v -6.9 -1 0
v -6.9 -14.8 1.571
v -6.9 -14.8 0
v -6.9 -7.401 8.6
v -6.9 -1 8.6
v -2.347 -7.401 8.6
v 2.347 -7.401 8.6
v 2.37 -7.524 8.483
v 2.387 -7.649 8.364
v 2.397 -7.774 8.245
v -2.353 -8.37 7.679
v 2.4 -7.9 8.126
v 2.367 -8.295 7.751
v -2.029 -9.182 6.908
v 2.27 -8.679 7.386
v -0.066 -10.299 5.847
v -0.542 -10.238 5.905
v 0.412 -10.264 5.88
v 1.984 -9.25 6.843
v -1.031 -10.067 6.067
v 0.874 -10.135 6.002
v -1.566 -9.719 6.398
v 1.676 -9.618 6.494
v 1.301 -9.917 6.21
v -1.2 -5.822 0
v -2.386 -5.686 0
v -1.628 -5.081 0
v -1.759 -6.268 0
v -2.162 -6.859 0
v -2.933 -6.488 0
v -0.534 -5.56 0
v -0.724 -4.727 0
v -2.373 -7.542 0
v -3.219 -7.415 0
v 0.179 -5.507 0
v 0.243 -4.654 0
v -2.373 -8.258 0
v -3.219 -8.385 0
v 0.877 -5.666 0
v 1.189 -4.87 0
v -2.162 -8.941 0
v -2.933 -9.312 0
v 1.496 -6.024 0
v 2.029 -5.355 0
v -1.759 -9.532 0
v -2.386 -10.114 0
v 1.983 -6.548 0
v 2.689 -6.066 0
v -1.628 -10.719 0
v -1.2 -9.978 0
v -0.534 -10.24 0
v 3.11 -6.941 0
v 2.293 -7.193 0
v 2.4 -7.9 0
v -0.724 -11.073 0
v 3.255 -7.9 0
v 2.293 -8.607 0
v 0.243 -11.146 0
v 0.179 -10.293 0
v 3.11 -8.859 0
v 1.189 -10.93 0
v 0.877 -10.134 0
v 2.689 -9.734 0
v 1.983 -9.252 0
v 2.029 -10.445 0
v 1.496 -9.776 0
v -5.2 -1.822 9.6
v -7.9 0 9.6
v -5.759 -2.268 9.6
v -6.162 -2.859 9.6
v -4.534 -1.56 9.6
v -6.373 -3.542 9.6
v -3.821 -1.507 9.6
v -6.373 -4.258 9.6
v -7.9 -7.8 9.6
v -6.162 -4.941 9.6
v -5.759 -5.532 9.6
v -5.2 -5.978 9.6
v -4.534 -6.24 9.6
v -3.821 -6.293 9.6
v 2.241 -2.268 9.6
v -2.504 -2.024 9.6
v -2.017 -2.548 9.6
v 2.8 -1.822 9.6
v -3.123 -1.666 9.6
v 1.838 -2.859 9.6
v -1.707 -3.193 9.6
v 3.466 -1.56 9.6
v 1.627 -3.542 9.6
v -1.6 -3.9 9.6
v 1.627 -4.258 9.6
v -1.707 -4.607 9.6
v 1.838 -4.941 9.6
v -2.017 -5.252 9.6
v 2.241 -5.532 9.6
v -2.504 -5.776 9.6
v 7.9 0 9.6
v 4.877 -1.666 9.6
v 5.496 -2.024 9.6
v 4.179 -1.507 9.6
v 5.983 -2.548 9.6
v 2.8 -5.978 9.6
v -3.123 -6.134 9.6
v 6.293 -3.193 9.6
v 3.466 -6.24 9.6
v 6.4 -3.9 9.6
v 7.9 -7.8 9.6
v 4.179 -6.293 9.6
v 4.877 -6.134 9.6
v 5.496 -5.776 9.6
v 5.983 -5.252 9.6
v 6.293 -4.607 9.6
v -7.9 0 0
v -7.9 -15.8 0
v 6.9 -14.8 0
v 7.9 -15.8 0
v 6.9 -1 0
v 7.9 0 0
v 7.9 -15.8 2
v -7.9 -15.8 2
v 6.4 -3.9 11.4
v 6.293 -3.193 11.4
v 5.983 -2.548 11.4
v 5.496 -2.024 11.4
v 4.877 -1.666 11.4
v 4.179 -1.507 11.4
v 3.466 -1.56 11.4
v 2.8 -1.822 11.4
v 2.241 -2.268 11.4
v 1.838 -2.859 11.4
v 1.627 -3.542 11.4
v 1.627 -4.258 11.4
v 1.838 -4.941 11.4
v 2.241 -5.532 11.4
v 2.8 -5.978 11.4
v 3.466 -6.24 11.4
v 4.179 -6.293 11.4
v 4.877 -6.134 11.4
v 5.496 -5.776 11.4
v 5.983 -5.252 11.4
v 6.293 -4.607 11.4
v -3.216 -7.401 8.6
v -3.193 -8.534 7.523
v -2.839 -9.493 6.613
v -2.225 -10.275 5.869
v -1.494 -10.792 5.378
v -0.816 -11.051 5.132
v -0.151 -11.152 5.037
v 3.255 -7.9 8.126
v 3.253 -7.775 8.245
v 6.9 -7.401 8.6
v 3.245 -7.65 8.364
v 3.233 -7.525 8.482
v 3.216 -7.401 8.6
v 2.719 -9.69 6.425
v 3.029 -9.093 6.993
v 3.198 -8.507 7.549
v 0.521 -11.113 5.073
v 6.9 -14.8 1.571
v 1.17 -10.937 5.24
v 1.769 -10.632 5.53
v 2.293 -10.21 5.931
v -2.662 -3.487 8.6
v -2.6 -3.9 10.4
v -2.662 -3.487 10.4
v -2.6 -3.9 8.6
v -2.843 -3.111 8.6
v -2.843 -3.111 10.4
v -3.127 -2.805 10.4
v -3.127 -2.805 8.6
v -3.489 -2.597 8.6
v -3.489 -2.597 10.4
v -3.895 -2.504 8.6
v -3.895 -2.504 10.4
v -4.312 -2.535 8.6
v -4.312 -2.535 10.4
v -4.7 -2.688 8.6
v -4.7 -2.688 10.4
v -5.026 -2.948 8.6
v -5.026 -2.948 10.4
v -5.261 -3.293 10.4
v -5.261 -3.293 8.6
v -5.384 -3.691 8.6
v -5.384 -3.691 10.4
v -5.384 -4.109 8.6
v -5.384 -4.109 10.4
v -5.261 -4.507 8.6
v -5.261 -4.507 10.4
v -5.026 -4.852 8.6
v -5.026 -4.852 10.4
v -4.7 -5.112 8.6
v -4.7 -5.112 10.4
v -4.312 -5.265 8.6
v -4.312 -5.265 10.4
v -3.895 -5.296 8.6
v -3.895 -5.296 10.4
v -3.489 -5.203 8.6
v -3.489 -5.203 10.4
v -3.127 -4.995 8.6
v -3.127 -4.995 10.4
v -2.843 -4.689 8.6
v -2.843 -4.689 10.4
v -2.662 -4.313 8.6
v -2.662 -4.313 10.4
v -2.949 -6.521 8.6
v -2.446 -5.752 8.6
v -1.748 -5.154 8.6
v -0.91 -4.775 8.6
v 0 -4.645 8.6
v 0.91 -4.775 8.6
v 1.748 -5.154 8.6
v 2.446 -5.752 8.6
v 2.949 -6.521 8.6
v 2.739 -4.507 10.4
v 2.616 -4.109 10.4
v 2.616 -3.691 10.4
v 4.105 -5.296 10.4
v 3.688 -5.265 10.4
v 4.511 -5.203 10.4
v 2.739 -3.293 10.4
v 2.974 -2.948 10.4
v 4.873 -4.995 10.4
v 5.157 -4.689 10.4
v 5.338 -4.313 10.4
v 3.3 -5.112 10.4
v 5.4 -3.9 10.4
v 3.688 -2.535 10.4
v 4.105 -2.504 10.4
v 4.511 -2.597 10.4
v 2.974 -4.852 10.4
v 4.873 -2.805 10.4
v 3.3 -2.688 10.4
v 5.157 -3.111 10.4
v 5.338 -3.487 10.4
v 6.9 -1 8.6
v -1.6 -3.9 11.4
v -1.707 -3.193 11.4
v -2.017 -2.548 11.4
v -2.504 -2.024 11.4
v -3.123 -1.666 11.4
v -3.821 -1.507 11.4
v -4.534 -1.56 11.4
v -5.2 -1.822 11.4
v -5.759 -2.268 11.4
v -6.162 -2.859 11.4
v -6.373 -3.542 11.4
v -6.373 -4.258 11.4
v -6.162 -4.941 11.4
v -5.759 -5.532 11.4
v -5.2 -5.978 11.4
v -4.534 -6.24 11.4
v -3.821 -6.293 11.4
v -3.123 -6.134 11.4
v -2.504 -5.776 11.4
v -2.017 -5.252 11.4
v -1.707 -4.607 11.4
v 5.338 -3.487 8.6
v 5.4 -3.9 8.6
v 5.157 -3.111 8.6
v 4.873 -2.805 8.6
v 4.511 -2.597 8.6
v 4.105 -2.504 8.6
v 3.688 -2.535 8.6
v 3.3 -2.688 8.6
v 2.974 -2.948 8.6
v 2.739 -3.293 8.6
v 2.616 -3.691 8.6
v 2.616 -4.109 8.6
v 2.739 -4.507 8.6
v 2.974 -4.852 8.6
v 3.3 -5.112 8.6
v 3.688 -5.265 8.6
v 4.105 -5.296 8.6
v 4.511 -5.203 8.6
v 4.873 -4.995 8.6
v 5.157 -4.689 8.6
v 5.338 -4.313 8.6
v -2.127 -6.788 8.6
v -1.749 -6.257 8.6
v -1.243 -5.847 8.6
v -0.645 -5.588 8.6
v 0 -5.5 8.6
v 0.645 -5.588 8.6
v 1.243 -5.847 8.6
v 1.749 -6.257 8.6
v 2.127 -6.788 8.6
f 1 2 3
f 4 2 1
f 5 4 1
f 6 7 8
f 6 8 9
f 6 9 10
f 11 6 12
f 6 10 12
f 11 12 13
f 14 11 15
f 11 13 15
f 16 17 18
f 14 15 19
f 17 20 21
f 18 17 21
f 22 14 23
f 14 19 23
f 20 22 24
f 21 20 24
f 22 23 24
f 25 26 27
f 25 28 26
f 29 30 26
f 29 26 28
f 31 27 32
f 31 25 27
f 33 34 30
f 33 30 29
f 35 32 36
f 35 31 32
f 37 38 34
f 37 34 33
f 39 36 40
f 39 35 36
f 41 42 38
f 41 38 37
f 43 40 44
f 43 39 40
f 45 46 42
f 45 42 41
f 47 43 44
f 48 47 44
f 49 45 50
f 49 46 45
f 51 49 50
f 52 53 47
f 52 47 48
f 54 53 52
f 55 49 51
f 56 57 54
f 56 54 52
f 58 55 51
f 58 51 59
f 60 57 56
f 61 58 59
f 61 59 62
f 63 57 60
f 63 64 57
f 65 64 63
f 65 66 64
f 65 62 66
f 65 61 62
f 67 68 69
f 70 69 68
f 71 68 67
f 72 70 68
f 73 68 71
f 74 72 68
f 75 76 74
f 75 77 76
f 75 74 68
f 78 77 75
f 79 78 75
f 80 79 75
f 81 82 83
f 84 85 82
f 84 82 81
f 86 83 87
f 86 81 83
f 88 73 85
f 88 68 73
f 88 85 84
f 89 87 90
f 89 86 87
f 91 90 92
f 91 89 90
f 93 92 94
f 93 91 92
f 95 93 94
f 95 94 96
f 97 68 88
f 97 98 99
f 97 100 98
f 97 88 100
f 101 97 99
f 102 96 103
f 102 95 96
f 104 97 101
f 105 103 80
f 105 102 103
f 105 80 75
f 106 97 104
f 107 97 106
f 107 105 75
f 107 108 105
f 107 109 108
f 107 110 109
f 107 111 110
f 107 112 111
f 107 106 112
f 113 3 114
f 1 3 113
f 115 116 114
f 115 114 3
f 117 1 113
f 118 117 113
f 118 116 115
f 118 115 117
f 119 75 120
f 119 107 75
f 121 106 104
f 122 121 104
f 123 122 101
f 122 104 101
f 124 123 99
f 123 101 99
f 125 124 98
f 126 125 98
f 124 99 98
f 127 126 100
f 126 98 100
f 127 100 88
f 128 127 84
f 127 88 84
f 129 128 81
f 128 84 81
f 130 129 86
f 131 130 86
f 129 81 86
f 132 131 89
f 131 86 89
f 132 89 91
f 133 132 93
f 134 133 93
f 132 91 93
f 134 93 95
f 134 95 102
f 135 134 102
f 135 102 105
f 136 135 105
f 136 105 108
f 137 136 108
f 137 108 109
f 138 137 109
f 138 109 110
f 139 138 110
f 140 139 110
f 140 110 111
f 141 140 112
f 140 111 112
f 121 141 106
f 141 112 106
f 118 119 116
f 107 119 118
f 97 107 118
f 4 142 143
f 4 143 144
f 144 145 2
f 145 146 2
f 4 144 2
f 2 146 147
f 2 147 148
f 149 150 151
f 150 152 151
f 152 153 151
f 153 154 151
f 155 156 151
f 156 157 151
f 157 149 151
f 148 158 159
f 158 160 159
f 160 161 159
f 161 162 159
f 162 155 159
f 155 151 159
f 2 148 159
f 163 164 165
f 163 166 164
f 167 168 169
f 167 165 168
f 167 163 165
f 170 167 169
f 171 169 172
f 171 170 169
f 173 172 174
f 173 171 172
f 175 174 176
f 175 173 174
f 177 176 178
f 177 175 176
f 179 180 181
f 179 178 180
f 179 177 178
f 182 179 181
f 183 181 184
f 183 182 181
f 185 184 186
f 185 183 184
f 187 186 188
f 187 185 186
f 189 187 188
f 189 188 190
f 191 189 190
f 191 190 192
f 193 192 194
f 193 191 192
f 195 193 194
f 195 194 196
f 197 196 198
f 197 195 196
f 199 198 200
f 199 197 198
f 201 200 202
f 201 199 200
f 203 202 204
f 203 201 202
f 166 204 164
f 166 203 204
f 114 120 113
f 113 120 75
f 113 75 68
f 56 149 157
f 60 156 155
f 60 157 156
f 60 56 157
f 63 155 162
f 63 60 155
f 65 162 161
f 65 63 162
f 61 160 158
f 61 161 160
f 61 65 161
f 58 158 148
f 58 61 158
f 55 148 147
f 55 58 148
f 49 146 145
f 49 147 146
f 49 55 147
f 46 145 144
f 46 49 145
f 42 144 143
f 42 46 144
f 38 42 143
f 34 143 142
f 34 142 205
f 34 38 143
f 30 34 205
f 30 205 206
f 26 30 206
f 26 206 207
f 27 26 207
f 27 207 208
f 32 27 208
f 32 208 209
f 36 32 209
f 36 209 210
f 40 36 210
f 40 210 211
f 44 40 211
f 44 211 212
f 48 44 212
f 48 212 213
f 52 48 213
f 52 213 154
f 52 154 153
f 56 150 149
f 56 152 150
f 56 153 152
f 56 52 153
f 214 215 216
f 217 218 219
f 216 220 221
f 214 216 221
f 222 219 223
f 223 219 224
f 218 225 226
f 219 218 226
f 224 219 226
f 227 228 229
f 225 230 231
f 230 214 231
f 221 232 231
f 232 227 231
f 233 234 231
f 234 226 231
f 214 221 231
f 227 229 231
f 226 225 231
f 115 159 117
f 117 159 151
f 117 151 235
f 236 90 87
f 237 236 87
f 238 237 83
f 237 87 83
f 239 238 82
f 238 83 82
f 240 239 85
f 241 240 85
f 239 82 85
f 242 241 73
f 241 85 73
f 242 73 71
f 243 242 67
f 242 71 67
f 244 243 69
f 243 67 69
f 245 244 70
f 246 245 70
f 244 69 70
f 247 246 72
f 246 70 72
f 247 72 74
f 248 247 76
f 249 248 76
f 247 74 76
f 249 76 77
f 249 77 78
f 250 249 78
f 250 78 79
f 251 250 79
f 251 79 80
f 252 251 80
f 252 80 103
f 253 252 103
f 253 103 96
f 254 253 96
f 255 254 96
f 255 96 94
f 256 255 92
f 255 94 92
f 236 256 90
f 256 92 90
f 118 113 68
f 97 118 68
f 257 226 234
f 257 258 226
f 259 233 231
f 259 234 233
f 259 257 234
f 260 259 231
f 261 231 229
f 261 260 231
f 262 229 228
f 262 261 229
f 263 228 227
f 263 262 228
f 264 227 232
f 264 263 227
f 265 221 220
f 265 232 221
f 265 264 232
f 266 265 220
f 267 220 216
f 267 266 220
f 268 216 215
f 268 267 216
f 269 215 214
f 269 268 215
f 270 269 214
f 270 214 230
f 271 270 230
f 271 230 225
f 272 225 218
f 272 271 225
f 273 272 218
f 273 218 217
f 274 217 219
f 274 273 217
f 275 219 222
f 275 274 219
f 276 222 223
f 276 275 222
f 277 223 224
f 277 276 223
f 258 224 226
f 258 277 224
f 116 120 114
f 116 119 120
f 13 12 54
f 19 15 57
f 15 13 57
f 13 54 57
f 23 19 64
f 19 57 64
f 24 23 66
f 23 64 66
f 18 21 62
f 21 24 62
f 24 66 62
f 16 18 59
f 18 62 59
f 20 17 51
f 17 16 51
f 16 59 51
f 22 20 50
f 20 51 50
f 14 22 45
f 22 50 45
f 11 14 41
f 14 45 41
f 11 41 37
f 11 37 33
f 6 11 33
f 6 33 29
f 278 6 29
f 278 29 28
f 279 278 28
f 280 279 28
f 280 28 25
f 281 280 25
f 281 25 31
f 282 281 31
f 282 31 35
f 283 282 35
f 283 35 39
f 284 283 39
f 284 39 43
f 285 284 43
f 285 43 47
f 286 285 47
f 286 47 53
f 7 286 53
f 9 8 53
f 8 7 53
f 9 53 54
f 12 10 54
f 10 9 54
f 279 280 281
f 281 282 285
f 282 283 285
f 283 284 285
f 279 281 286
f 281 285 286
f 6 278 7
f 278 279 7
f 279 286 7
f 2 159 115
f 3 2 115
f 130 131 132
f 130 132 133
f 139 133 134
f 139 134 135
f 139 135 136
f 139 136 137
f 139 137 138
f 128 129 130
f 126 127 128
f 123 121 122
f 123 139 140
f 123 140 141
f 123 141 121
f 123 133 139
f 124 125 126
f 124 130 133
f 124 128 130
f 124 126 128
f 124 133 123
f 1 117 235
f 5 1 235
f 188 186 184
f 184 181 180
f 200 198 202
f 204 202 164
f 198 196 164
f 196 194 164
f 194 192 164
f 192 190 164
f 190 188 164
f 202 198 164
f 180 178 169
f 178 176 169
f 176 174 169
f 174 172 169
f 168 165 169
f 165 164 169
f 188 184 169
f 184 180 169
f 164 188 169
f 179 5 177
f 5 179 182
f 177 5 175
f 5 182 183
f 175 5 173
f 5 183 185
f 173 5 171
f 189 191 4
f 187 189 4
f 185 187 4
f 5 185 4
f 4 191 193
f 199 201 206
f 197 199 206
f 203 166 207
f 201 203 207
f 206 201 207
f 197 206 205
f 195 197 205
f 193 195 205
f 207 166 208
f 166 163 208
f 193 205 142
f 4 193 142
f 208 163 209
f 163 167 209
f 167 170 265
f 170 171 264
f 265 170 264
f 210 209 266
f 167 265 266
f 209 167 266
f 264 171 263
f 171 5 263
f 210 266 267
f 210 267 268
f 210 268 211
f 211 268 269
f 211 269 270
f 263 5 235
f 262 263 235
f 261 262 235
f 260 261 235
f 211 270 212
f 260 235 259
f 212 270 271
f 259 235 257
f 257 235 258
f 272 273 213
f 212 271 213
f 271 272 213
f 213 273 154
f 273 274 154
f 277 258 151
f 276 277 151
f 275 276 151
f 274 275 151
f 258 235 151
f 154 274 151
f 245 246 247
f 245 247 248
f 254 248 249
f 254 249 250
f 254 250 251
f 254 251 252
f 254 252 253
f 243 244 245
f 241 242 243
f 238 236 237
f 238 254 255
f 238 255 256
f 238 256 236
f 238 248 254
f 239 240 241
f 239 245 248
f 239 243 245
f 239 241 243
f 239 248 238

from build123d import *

# Parameters (mm, degrees)
F1_DEPTH = 7.9
F2_R     = 2.4
F3_DEPTH = 1.8
F4_T     = -1
F5_R     = 3.255
F5_R_2   = 2.4


with BuildPart() as f1:
    # F0 (on Right) → F1 (new body, symmetric)
    with BuildSketch(Plane.YZ):
        Polygon((-15.8, 0), (0, 0), (0, 9.6), (-7.8, 9.6), (-15.8, 2), align=None)
    extrude(amount=F1_DEPTH, both=True)

    # F2 (on face) → F3 (join)
    with BuildSketch(Plane.XY.offset(9.6)):
        with Locations((-4, -3.9)):
            Circle(F2_R)
        with Locations((4, -3.9)):
            Circle(F2_R)
    extrude(amount=F3_DEPTH)

    # F4
    f4_openings = [f1.faces().sort_by_distance(p)[0] for p in [
        (0, -7.9, 0),
    ]]
    offset(amount=F4_T, openings=f4_openings, kind=Kind.INTERSECTION)

    # F5 (on face) → F6 (join, up to the next surface of F1)
    with BuildSketch(Plane(origin=(0, 0, 0), x_dir=(1, 0, 0), z_dir=(0, 0, -1))):
        with Locations((0, 7.9)):
            Circle(F5_R)
        with Locations((0, 7.9)):
            Circle(F5_R_2, mode=Mode.SUBTRACT)
    extrude(until=Until.NEXT, dir=(0, 0, 1))


solid = f1.part
